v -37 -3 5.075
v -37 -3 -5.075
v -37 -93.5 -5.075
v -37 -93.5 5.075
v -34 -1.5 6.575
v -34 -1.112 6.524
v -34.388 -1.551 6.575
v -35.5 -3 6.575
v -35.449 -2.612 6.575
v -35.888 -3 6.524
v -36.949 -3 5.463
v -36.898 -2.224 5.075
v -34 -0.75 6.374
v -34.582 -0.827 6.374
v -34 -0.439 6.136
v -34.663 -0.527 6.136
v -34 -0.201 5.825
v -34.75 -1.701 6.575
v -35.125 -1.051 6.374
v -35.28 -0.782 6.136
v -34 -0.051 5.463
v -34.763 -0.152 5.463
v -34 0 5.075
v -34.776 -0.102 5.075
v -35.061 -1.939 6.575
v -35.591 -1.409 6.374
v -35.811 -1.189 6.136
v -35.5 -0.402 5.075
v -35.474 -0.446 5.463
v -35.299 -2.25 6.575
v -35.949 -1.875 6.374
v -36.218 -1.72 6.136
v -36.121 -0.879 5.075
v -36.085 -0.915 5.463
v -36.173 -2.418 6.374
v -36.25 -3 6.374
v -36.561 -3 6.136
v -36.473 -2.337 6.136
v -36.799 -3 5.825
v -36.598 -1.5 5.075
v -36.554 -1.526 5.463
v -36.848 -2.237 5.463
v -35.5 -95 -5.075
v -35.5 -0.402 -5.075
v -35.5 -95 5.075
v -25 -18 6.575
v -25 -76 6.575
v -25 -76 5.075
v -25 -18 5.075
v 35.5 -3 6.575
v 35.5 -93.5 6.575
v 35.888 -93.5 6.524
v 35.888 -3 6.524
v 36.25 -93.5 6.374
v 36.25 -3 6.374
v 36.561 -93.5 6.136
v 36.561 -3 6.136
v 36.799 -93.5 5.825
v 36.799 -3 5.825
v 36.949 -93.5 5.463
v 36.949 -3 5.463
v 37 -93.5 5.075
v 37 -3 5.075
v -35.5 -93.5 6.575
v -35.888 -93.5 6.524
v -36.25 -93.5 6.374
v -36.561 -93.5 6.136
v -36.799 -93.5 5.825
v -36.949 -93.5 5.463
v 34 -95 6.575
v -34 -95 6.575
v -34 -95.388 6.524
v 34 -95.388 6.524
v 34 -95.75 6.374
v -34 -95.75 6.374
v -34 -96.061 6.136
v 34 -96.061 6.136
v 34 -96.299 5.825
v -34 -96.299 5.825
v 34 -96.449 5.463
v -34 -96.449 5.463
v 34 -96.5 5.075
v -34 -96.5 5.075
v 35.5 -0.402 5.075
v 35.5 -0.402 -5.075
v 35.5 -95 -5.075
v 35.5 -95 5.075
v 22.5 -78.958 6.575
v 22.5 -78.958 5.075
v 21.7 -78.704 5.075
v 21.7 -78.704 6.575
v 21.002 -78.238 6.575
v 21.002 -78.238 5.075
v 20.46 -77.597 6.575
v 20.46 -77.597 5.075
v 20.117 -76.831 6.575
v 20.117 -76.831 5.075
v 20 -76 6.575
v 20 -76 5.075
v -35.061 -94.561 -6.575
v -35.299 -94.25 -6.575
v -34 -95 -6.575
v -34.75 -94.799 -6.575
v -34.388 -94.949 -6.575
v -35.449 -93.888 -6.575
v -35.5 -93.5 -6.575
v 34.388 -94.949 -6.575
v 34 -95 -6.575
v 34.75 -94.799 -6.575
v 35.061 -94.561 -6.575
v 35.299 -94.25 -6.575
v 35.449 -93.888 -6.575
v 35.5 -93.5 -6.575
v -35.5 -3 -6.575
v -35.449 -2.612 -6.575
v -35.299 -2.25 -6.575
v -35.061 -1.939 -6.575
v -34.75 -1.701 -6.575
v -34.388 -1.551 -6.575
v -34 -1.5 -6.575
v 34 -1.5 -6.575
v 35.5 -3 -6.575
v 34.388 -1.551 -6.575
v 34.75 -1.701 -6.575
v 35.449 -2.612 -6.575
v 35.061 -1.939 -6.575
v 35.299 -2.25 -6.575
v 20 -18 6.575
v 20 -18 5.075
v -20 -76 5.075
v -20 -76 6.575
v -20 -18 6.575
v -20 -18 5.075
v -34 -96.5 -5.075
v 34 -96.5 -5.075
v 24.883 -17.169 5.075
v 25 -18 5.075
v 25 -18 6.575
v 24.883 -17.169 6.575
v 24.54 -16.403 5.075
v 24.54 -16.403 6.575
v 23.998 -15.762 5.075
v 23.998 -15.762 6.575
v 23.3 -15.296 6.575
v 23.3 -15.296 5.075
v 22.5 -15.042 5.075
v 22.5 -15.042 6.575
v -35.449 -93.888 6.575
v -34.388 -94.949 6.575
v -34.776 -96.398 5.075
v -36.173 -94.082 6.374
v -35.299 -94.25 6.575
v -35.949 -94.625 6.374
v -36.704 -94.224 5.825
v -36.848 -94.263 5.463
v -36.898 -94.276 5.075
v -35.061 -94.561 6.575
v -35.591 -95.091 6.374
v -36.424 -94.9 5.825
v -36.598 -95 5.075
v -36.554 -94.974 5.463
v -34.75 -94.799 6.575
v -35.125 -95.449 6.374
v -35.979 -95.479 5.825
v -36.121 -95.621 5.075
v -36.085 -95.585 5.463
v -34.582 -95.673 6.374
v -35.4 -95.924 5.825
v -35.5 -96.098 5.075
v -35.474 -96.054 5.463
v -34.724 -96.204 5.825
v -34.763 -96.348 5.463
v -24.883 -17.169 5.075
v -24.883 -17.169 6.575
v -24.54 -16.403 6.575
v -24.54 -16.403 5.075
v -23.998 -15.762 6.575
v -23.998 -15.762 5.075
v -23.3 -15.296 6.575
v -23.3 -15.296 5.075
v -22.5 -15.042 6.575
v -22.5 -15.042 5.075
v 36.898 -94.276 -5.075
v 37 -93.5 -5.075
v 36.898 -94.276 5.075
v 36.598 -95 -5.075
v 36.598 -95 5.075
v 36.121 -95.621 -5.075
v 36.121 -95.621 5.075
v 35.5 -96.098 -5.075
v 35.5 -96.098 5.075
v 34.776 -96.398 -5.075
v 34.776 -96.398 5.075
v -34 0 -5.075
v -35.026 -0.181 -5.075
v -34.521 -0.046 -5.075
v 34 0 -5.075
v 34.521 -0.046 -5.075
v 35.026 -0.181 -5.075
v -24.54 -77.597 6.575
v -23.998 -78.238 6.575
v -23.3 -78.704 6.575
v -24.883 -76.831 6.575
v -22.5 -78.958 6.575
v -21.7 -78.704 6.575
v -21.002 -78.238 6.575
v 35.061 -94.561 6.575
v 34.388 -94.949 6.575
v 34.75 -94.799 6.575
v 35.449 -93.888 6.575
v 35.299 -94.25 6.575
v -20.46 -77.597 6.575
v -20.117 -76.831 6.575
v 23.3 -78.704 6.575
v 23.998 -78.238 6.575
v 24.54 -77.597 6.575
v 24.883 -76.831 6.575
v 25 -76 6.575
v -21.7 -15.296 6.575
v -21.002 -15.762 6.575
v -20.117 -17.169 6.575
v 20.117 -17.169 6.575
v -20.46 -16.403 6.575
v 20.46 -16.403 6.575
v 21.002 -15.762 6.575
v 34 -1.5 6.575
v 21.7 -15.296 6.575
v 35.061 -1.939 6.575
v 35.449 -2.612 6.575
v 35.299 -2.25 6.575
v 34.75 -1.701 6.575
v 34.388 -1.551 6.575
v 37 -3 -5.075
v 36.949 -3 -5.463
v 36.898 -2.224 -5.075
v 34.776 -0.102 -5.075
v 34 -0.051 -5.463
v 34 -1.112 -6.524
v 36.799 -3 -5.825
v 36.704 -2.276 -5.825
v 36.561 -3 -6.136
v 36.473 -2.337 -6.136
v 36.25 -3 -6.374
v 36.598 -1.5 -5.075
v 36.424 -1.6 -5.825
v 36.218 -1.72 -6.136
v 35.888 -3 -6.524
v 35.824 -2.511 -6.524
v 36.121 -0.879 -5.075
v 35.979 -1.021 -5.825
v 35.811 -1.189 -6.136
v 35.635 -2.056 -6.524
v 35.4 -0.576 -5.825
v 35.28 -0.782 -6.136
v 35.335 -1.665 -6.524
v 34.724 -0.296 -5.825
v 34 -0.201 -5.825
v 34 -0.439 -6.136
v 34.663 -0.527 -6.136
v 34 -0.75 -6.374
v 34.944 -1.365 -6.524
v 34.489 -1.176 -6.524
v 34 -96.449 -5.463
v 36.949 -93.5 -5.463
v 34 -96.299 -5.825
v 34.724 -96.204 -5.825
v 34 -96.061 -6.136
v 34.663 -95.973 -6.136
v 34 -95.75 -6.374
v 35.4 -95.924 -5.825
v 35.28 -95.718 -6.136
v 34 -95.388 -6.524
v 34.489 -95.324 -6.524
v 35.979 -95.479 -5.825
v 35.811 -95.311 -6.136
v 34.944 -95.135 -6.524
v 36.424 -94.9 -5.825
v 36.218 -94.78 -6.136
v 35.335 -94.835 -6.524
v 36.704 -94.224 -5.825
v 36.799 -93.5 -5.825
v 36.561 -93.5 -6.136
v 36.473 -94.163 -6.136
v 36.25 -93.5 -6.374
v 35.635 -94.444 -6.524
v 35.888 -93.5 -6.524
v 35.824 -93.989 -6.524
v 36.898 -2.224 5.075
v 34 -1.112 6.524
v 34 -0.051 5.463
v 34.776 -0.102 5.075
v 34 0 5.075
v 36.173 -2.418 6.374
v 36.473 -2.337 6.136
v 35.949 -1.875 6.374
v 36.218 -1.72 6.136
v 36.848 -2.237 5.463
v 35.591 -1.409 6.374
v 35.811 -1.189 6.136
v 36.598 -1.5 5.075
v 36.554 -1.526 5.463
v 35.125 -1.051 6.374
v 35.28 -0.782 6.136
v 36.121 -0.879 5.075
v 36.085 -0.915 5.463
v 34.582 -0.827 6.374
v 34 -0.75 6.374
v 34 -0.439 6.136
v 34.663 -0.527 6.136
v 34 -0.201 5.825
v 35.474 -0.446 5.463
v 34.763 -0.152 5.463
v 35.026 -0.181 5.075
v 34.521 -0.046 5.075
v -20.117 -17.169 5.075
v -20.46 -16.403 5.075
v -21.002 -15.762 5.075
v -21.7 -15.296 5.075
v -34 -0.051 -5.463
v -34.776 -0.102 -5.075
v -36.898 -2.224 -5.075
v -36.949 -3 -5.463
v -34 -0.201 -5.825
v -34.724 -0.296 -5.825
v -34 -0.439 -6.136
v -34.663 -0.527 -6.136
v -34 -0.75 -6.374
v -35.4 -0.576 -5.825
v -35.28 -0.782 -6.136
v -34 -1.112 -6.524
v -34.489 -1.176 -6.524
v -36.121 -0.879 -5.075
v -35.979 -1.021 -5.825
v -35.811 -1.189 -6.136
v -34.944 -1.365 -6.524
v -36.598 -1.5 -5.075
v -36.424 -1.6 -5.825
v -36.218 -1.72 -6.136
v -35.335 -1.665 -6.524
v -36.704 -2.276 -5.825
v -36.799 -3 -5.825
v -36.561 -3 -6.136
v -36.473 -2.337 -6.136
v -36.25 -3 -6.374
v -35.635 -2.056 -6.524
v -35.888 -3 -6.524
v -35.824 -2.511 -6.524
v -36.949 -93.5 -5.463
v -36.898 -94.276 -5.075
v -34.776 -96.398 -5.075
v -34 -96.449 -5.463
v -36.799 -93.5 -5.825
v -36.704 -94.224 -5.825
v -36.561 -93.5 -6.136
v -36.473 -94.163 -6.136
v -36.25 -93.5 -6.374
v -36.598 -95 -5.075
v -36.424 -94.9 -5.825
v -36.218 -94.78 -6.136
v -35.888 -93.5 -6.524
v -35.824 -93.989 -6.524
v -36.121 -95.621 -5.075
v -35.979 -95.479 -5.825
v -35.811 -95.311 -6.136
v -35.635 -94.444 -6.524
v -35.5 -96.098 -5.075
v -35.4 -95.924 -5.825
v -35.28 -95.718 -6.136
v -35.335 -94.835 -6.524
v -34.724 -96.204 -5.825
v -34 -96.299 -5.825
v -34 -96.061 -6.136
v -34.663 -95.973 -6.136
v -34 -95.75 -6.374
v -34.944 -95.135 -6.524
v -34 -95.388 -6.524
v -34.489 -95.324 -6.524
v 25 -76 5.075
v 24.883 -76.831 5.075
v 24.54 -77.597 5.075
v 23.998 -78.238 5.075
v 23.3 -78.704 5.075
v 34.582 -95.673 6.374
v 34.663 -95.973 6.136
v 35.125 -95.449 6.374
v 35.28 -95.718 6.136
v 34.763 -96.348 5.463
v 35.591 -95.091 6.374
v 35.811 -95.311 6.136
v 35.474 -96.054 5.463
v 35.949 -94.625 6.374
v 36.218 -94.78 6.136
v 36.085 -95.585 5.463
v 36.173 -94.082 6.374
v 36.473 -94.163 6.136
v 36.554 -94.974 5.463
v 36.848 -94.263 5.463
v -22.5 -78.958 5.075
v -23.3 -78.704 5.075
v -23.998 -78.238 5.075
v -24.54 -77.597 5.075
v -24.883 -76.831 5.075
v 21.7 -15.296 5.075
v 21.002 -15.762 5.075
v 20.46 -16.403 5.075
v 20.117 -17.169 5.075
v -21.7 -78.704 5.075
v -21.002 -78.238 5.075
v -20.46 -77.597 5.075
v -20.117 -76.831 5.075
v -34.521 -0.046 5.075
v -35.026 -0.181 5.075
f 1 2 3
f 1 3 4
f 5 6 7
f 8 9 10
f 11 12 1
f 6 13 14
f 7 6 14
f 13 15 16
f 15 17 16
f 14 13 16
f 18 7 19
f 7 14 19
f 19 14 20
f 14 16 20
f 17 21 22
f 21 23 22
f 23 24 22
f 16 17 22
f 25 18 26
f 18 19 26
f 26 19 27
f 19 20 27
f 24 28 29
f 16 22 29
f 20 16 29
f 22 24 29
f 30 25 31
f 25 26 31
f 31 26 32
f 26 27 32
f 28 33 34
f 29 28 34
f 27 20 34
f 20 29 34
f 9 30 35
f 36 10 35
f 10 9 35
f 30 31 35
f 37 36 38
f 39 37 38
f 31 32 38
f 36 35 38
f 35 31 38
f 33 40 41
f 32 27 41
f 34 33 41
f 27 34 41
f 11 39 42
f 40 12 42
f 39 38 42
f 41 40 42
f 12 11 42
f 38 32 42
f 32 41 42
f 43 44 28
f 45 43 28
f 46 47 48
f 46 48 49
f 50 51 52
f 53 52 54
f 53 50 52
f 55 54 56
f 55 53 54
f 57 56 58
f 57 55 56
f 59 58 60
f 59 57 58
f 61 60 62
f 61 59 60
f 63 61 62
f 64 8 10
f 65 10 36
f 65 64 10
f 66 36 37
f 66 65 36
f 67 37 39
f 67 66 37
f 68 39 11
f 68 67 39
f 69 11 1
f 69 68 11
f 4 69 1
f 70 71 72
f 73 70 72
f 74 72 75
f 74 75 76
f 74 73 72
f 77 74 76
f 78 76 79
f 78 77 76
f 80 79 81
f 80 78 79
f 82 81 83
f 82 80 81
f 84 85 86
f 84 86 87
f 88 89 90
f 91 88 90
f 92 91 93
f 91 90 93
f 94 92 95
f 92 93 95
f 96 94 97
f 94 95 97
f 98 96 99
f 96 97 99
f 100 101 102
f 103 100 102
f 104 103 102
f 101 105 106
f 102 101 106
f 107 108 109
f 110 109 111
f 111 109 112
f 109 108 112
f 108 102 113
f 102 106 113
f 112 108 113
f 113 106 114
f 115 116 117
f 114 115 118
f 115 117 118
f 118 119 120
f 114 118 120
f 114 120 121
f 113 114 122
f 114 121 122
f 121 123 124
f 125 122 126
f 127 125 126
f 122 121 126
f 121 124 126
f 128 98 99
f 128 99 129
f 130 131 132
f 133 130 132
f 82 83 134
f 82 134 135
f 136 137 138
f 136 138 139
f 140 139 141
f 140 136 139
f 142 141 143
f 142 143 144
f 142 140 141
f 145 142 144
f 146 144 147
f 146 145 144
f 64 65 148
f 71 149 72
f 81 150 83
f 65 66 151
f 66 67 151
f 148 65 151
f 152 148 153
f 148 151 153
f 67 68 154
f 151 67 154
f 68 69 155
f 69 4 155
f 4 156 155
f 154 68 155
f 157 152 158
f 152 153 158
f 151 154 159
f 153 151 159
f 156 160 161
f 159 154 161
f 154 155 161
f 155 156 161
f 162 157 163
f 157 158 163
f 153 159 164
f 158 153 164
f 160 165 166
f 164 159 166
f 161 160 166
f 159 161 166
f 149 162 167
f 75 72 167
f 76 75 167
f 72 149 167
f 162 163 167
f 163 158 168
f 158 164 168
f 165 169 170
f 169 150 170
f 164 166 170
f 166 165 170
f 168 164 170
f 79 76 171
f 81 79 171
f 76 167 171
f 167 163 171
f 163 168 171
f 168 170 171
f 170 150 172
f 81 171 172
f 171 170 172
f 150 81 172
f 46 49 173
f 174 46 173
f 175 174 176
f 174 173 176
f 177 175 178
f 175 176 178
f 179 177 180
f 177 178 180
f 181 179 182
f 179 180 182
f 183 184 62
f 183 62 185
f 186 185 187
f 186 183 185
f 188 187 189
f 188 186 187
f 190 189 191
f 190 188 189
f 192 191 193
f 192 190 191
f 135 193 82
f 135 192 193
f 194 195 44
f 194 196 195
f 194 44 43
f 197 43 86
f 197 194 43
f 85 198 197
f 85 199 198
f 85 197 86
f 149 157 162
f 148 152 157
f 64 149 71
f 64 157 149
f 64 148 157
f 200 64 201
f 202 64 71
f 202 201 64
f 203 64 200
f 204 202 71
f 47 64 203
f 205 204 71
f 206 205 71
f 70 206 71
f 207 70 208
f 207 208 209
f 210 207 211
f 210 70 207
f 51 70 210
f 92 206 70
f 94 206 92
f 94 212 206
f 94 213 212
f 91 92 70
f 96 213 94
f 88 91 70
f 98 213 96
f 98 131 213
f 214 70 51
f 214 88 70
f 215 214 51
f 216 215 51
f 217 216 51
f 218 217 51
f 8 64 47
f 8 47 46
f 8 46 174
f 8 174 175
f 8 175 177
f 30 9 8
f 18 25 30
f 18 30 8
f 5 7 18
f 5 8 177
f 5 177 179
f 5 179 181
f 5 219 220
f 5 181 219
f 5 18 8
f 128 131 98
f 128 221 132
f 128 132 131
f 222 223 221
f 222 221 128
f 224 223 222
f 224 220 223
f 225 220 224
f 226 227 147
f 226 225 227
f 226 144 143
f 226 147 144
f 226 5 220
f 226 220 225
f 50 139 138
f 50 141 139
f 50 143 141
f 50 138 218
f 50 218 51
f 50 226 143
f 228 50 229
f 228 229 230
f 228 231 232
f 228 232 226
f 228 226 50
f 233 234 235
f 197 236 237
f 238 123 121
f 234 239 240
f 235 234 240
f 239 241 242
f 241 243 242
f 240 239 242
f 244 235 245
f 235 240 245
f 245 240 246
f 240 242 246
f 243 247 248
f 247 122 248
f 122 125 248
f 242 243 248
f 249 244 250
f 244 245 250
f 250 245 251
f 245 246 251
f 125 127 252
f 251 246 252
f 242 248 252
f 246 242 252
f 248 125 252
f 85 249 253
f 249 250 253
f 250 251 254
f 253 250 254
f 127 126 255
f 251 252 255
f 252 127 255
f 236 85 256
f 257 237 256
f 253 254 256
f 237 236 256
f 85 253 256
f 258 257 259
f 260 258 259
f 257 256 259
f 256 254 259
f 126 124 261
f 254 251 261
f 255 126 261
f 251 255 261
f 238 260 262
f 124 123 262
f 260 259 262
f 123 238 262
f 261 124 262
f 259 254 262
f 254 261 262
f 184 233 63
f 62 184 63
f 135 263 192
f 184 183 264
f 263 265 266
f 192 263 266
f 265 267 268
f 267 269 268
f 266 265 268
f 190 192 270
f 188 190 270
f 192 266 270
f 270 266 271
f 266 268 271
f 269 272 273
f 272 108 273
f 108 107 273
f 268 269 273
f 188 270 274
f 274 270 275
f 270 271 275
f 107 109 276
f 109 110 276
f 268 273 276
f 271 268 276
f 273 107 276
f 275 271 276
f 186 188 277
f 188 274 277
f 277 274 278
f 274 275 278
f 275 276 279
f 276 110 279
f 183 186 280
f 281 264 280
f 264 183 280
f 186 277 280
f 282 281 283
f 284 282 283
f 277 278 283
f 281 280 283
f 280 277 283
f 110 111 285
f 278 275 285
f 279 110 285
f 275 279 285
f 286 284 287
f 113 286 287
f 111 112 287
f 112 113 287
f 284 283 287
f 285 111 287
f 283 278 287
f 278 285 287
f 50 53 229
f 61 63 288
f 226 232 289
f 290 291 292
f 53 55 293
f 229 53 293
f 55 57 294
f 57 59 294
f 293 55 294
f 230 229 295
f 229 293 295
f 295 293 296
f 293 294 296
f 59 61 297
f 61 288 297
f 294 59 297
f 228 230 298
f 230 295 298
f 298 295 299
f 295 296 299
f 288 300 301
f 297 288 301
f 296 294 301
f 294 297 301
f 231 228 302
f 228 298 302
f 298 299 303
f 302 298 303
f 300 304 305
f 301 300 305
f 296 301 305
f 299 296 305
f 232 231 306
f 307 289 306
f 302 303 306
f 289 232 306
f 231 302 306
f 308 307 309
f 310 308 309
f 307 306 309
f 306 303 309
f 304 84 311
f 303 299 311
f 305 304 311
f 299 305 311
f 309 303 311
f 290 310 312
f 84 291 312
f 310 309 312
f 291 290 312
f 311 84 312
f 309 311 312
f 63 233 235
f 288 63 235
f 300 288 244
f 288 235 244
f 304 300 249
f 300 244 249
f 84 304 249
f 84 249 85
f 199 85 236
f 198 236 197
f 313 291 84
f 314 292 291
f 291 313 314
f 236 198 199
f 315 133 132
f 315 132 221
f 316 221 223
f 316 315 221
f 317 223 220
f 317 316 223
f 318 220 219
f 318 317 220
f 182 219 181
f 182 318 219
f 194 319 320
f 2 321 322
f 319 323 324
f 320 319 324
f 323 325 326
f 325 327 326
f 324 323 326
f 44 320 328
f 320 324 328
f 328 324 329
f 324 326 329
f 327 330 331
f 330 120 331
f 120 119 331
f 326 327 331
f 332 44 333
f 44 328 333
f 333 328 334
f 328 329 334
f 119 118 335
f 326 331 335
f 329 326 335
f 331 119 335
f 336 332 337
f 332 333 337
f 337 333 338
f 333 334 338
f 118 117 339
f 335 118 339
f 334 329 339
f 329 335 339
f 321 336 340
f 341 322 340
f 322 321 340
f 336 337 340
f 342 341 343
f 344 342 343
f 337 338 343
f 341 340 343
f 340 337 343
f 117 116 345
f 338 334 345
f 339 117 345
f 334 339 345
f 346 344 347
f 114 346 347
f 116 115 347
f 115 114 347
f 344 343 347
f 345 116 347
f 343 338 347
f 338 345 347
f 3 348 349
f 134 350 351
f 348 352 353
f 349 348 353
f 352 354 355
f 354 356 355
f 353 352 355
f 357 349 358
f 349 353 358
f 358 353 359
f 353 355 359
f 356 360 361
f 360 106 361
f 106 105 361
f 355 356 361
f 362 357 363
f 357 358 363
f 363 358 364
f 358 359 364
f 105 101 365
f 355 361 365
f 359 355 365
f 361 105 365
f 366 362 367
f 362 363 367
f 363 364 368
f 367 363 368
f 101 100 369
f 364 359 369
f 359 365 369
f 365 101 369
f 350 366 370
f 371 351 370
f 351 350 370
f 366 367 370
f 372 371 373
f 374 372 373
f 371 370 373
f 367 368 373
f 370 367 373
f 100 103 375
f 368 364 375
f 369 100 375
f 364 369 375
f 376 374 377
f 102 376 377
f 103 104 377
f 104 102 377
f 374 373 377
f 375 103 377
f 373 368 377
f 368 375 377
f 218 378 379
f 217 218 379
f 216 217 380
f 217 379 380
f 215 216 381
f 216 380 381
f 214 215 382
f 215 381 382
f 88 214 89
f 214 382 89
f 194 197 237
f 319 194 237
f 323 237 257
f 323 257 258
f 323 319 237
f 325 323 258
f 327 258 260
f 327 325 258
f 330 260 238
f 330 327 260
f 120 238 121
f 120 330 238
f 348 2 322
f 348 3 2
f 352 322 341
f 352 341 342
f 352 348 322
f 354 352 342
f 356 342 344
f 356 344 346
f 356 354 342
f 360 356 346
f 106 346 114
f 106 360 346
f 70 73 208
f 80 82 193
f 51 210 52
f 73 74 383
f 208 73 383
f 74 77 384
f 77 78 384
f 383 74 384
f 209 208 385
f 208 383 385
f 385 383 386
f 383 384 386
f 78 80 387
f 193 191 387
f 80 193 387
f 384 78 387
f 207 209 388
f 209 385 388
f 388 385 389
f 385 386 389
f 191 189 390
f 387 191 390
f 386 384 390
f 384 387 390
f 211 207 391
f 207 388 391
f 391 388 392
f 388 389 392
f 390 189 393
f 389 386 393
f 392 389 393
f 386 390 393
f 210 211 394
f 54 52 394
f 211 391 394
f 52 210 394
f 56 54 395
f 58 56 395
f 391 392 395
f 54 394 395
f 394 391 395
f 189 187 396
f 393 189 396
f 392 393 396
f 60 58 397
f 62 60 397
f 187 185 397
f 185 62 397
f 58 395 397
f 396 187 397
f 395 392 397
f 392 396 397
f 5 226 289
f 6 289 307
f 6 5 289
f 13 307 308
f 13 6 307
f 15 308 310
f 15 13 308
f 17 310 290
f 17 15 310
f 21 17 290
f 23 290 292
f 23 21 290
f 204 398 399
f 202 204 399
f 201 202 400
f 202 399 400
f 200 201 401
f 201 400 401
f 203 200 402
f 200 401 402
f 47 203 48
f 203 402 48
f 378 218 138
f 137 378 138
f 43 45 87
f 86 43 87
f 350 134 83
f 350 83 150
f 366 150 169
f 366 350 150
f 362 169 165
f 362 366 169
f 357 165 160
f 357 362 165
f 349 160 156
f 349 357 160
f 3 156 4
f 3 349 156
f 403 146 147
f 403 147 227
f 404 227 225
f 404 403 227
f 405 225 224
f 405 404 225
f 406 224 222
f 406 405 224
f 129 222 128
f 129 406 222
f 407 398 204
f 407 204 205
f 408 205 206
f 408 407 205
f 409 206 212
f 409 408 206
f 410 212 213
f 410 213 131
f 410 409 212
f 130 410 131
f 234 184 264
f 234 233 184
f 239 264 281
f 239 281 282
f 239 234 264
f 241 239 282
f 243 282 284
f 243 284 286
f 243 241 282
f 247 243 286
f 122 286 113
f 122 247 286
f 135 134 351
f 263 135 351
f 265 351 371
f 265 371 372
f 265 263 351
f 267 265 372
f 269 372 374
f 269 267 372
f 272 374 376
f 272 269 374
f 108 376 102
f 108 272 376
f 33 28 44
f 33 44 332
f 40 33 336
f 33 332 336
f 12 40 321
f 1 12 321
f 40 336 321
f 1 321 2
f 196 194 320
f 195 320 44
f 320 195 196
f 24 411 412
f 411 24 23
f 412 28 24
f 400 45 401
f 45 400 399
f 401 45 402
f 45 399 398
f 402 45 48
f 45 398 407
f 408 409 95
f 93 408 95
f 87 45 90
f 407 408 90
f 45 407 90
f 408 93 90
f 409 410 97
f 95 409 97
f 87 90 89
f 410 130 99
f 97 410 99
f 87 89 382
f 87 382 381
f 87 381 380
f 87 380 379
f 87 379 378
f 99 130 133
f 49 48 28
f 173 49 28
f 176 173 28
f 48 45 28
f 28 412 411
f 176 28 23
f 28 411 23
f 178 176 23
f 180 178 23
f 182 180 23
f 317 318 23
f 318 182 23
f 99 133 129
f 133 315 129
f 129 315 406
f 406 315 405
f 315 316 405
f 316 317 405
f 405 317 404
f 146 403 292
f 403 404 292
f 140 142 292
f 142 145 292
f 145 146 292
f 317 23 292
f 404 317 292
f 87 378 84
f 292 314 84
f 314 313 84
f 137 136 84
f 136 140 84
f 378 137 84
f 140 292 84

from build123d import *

# Parameters (mm, degrees)
F0_W        = 74
F0_H        = 13.15
F0_W_2      = 71
F0_H_2      = 10.15
F1_DEPTH    = 96.5
F2_DEPTH    = 95
F3_W        = 5
F3_H        = 64
F4_DEPTH    = 3
F5_T1_DEPTH = 28.15
F6_T1_DEPTH = 1.5
F7_R        = 1.49999


# Not quite as in the source:
# - a fillet or chamfer that OpenCascade refuses, or shapes differently, is made with other operations: its cross-section is extruded or revolved along the edge and cut away or added
# - a fillet or chamfer is up to 0.001 mm smaller than in the source, because OpenCascade refuses the exact size


with BuildPart() as f1:
    # F0 (on Front) → F1 (new body)
    with BuildSketch(Plane.XZ):
        Rectangle(F0_W, F0_H)
        Rectangle(F0_W_2, F0_H_2, mode=Mode.SUBTRACT)
        Rectangle(F0_W_2, F0_H_2)
    extrude(amount=F1_DEPTH)

    # F0 (on Front) → F2 (cut)
    with BuildSketch(Plane.XZ):
        Rectangle(F0_W_2, F0_H_2)
    extrude(amount=F2_DEPTH, mode=Mode.SUBTRACT)

    # F3 (on face) → F4 (cut)
    with BuildSketch(Plane.XY.offset(6.575)):
        with Locations((22.5, -47)):
            Rectangle(F3_W, F3_H)
        with Locations((-22.5, -47)):
            Rectangle(F3_W, F3_H)
    extrude(amount=-F4_DEPTH, mode=Mode.SUBTRACT)

    # F5: fillet of radius 3 on 4 edges, made by hand

    # F5_s2 → F5_t1 (cut)
    with BuildSketch(Plane.XY.offset(-14.075)):
        with BuildLine():
            ThreePointArc((37, -93.5), (36.1213203436, -95.6213203436), (34, -96.5))
            Line((34, -96.5), (37, -96.5))
            Line((37, -96.5), (37, -93.5))
        make_face()
        with BuildLine():
            ThreePointArc((-34, 0), (-36.1213203436, -0.8786796564), (-37, -3))
            Line((-37, -3), (-37, 0))
            Line((-37, 0), (-34, 0))
        make_face()
        with BuildLine():
            ThreePointArc((37, -3), (36.1213203436, -0.8786796564), (34, 0))
            Line((34, 0), (37, 0))
            Line((37, 0), (37, -3))
        make_face()
        with BuildLine():
            ThreePointArc((-34, -96.5), (-36.1213203436, -95.6213203436), (-37, -93.5))
            Line((-37, -93.5), (-37, -96.5))
            Line((-37, -96.5), (-34, -96.5))
        make_face()
    extrude(amount=F5_T1_DEPTH, mode=Mode.SUBTRACT)

    # F6: fillet of radius 3 on 8 edges, made by hand

    # F6_s2 → F6_t1 (join)
    with BuildSketch(Plane.XY.offset(5.075)):
        with BuildLine():
            ThreePointArc((25, -76), (24.1213203436, -78.1213203436), (22, -79))
            Line((22, -79), (25, -79))
            Line((25, -79), (25, -76))
        make_face()
        with BuildLine():
            ThreePointArc((23, -15), (20.8786796564, -15.8786796564), (20, -18))
            Line((20, -18), (20, -15))
            Line((20, -15), (23, -15))
        make_face()
        with BuildLine():
            ThreePointArc((25, -18), (24.1213203436, -15.8786796564), (22, -15))
            Line((22, -15), (25, -15))
            Line((25, -15), (25, -18))
        make_face()
        with BuildLine():
            ThreePointArc((23, -79), (20.8786796564, -78.1213203436), (20, -76))
            Line((20, -76), (20, -79))
            Line((20, -79), (23, -79))
        make_face()
        with BuildLine():
            ThreePointArc((-23, -79), (-20.8786796564, -78.1213203436), (-20, -76))
            Line((-20, -76), (-20, -79))
            Line((-20, -79), (-23, -79))
        make_face()
        with BuildLine():
            ThreePointArc((-25, -18), (-24.1213203436, -15.8786796564), (-22, -15))
            Line((-22, -15), (-25, -15))
            Line((-25, -15), (-25, -18))
        make_face()
        with BuildLine():
            ThreePointArc((-22, -79), (-24.1213203436, -78.1213203436), (-25, -76))
            Line((-25, -76), (-25, -79))
            Line((-25, -79), (-22, -79))
        make_face()
        with BuildLine():
            ThreePointArc((-20, -18), (-20.8786796564, -15.8786796564), (-23, -15))
            Line((-23, -15), (-20, -15))
            Line((-20, -15), (-20, -18))
        make_face()
    extrude(amount=F6_T1_DEPTH)

    # F7 (radius 1.5 in the source; OpenCascade refuses exactly that, so slightly less here)
    f7_edges = [f1.edges().sort_by_distance(p)[0] for p in [
        (0, -96.5, 6.575),
        (37, -48.25, 6.575),
        (-37, -48.25, 6.575),
        (0, -96.5, -6.575),
        (37, -48.25, -6.575),
        (-37, -48.25, -6.575),
    ]]
    fillet(f7_edges, radius=F7_R)


solid = f1.part
